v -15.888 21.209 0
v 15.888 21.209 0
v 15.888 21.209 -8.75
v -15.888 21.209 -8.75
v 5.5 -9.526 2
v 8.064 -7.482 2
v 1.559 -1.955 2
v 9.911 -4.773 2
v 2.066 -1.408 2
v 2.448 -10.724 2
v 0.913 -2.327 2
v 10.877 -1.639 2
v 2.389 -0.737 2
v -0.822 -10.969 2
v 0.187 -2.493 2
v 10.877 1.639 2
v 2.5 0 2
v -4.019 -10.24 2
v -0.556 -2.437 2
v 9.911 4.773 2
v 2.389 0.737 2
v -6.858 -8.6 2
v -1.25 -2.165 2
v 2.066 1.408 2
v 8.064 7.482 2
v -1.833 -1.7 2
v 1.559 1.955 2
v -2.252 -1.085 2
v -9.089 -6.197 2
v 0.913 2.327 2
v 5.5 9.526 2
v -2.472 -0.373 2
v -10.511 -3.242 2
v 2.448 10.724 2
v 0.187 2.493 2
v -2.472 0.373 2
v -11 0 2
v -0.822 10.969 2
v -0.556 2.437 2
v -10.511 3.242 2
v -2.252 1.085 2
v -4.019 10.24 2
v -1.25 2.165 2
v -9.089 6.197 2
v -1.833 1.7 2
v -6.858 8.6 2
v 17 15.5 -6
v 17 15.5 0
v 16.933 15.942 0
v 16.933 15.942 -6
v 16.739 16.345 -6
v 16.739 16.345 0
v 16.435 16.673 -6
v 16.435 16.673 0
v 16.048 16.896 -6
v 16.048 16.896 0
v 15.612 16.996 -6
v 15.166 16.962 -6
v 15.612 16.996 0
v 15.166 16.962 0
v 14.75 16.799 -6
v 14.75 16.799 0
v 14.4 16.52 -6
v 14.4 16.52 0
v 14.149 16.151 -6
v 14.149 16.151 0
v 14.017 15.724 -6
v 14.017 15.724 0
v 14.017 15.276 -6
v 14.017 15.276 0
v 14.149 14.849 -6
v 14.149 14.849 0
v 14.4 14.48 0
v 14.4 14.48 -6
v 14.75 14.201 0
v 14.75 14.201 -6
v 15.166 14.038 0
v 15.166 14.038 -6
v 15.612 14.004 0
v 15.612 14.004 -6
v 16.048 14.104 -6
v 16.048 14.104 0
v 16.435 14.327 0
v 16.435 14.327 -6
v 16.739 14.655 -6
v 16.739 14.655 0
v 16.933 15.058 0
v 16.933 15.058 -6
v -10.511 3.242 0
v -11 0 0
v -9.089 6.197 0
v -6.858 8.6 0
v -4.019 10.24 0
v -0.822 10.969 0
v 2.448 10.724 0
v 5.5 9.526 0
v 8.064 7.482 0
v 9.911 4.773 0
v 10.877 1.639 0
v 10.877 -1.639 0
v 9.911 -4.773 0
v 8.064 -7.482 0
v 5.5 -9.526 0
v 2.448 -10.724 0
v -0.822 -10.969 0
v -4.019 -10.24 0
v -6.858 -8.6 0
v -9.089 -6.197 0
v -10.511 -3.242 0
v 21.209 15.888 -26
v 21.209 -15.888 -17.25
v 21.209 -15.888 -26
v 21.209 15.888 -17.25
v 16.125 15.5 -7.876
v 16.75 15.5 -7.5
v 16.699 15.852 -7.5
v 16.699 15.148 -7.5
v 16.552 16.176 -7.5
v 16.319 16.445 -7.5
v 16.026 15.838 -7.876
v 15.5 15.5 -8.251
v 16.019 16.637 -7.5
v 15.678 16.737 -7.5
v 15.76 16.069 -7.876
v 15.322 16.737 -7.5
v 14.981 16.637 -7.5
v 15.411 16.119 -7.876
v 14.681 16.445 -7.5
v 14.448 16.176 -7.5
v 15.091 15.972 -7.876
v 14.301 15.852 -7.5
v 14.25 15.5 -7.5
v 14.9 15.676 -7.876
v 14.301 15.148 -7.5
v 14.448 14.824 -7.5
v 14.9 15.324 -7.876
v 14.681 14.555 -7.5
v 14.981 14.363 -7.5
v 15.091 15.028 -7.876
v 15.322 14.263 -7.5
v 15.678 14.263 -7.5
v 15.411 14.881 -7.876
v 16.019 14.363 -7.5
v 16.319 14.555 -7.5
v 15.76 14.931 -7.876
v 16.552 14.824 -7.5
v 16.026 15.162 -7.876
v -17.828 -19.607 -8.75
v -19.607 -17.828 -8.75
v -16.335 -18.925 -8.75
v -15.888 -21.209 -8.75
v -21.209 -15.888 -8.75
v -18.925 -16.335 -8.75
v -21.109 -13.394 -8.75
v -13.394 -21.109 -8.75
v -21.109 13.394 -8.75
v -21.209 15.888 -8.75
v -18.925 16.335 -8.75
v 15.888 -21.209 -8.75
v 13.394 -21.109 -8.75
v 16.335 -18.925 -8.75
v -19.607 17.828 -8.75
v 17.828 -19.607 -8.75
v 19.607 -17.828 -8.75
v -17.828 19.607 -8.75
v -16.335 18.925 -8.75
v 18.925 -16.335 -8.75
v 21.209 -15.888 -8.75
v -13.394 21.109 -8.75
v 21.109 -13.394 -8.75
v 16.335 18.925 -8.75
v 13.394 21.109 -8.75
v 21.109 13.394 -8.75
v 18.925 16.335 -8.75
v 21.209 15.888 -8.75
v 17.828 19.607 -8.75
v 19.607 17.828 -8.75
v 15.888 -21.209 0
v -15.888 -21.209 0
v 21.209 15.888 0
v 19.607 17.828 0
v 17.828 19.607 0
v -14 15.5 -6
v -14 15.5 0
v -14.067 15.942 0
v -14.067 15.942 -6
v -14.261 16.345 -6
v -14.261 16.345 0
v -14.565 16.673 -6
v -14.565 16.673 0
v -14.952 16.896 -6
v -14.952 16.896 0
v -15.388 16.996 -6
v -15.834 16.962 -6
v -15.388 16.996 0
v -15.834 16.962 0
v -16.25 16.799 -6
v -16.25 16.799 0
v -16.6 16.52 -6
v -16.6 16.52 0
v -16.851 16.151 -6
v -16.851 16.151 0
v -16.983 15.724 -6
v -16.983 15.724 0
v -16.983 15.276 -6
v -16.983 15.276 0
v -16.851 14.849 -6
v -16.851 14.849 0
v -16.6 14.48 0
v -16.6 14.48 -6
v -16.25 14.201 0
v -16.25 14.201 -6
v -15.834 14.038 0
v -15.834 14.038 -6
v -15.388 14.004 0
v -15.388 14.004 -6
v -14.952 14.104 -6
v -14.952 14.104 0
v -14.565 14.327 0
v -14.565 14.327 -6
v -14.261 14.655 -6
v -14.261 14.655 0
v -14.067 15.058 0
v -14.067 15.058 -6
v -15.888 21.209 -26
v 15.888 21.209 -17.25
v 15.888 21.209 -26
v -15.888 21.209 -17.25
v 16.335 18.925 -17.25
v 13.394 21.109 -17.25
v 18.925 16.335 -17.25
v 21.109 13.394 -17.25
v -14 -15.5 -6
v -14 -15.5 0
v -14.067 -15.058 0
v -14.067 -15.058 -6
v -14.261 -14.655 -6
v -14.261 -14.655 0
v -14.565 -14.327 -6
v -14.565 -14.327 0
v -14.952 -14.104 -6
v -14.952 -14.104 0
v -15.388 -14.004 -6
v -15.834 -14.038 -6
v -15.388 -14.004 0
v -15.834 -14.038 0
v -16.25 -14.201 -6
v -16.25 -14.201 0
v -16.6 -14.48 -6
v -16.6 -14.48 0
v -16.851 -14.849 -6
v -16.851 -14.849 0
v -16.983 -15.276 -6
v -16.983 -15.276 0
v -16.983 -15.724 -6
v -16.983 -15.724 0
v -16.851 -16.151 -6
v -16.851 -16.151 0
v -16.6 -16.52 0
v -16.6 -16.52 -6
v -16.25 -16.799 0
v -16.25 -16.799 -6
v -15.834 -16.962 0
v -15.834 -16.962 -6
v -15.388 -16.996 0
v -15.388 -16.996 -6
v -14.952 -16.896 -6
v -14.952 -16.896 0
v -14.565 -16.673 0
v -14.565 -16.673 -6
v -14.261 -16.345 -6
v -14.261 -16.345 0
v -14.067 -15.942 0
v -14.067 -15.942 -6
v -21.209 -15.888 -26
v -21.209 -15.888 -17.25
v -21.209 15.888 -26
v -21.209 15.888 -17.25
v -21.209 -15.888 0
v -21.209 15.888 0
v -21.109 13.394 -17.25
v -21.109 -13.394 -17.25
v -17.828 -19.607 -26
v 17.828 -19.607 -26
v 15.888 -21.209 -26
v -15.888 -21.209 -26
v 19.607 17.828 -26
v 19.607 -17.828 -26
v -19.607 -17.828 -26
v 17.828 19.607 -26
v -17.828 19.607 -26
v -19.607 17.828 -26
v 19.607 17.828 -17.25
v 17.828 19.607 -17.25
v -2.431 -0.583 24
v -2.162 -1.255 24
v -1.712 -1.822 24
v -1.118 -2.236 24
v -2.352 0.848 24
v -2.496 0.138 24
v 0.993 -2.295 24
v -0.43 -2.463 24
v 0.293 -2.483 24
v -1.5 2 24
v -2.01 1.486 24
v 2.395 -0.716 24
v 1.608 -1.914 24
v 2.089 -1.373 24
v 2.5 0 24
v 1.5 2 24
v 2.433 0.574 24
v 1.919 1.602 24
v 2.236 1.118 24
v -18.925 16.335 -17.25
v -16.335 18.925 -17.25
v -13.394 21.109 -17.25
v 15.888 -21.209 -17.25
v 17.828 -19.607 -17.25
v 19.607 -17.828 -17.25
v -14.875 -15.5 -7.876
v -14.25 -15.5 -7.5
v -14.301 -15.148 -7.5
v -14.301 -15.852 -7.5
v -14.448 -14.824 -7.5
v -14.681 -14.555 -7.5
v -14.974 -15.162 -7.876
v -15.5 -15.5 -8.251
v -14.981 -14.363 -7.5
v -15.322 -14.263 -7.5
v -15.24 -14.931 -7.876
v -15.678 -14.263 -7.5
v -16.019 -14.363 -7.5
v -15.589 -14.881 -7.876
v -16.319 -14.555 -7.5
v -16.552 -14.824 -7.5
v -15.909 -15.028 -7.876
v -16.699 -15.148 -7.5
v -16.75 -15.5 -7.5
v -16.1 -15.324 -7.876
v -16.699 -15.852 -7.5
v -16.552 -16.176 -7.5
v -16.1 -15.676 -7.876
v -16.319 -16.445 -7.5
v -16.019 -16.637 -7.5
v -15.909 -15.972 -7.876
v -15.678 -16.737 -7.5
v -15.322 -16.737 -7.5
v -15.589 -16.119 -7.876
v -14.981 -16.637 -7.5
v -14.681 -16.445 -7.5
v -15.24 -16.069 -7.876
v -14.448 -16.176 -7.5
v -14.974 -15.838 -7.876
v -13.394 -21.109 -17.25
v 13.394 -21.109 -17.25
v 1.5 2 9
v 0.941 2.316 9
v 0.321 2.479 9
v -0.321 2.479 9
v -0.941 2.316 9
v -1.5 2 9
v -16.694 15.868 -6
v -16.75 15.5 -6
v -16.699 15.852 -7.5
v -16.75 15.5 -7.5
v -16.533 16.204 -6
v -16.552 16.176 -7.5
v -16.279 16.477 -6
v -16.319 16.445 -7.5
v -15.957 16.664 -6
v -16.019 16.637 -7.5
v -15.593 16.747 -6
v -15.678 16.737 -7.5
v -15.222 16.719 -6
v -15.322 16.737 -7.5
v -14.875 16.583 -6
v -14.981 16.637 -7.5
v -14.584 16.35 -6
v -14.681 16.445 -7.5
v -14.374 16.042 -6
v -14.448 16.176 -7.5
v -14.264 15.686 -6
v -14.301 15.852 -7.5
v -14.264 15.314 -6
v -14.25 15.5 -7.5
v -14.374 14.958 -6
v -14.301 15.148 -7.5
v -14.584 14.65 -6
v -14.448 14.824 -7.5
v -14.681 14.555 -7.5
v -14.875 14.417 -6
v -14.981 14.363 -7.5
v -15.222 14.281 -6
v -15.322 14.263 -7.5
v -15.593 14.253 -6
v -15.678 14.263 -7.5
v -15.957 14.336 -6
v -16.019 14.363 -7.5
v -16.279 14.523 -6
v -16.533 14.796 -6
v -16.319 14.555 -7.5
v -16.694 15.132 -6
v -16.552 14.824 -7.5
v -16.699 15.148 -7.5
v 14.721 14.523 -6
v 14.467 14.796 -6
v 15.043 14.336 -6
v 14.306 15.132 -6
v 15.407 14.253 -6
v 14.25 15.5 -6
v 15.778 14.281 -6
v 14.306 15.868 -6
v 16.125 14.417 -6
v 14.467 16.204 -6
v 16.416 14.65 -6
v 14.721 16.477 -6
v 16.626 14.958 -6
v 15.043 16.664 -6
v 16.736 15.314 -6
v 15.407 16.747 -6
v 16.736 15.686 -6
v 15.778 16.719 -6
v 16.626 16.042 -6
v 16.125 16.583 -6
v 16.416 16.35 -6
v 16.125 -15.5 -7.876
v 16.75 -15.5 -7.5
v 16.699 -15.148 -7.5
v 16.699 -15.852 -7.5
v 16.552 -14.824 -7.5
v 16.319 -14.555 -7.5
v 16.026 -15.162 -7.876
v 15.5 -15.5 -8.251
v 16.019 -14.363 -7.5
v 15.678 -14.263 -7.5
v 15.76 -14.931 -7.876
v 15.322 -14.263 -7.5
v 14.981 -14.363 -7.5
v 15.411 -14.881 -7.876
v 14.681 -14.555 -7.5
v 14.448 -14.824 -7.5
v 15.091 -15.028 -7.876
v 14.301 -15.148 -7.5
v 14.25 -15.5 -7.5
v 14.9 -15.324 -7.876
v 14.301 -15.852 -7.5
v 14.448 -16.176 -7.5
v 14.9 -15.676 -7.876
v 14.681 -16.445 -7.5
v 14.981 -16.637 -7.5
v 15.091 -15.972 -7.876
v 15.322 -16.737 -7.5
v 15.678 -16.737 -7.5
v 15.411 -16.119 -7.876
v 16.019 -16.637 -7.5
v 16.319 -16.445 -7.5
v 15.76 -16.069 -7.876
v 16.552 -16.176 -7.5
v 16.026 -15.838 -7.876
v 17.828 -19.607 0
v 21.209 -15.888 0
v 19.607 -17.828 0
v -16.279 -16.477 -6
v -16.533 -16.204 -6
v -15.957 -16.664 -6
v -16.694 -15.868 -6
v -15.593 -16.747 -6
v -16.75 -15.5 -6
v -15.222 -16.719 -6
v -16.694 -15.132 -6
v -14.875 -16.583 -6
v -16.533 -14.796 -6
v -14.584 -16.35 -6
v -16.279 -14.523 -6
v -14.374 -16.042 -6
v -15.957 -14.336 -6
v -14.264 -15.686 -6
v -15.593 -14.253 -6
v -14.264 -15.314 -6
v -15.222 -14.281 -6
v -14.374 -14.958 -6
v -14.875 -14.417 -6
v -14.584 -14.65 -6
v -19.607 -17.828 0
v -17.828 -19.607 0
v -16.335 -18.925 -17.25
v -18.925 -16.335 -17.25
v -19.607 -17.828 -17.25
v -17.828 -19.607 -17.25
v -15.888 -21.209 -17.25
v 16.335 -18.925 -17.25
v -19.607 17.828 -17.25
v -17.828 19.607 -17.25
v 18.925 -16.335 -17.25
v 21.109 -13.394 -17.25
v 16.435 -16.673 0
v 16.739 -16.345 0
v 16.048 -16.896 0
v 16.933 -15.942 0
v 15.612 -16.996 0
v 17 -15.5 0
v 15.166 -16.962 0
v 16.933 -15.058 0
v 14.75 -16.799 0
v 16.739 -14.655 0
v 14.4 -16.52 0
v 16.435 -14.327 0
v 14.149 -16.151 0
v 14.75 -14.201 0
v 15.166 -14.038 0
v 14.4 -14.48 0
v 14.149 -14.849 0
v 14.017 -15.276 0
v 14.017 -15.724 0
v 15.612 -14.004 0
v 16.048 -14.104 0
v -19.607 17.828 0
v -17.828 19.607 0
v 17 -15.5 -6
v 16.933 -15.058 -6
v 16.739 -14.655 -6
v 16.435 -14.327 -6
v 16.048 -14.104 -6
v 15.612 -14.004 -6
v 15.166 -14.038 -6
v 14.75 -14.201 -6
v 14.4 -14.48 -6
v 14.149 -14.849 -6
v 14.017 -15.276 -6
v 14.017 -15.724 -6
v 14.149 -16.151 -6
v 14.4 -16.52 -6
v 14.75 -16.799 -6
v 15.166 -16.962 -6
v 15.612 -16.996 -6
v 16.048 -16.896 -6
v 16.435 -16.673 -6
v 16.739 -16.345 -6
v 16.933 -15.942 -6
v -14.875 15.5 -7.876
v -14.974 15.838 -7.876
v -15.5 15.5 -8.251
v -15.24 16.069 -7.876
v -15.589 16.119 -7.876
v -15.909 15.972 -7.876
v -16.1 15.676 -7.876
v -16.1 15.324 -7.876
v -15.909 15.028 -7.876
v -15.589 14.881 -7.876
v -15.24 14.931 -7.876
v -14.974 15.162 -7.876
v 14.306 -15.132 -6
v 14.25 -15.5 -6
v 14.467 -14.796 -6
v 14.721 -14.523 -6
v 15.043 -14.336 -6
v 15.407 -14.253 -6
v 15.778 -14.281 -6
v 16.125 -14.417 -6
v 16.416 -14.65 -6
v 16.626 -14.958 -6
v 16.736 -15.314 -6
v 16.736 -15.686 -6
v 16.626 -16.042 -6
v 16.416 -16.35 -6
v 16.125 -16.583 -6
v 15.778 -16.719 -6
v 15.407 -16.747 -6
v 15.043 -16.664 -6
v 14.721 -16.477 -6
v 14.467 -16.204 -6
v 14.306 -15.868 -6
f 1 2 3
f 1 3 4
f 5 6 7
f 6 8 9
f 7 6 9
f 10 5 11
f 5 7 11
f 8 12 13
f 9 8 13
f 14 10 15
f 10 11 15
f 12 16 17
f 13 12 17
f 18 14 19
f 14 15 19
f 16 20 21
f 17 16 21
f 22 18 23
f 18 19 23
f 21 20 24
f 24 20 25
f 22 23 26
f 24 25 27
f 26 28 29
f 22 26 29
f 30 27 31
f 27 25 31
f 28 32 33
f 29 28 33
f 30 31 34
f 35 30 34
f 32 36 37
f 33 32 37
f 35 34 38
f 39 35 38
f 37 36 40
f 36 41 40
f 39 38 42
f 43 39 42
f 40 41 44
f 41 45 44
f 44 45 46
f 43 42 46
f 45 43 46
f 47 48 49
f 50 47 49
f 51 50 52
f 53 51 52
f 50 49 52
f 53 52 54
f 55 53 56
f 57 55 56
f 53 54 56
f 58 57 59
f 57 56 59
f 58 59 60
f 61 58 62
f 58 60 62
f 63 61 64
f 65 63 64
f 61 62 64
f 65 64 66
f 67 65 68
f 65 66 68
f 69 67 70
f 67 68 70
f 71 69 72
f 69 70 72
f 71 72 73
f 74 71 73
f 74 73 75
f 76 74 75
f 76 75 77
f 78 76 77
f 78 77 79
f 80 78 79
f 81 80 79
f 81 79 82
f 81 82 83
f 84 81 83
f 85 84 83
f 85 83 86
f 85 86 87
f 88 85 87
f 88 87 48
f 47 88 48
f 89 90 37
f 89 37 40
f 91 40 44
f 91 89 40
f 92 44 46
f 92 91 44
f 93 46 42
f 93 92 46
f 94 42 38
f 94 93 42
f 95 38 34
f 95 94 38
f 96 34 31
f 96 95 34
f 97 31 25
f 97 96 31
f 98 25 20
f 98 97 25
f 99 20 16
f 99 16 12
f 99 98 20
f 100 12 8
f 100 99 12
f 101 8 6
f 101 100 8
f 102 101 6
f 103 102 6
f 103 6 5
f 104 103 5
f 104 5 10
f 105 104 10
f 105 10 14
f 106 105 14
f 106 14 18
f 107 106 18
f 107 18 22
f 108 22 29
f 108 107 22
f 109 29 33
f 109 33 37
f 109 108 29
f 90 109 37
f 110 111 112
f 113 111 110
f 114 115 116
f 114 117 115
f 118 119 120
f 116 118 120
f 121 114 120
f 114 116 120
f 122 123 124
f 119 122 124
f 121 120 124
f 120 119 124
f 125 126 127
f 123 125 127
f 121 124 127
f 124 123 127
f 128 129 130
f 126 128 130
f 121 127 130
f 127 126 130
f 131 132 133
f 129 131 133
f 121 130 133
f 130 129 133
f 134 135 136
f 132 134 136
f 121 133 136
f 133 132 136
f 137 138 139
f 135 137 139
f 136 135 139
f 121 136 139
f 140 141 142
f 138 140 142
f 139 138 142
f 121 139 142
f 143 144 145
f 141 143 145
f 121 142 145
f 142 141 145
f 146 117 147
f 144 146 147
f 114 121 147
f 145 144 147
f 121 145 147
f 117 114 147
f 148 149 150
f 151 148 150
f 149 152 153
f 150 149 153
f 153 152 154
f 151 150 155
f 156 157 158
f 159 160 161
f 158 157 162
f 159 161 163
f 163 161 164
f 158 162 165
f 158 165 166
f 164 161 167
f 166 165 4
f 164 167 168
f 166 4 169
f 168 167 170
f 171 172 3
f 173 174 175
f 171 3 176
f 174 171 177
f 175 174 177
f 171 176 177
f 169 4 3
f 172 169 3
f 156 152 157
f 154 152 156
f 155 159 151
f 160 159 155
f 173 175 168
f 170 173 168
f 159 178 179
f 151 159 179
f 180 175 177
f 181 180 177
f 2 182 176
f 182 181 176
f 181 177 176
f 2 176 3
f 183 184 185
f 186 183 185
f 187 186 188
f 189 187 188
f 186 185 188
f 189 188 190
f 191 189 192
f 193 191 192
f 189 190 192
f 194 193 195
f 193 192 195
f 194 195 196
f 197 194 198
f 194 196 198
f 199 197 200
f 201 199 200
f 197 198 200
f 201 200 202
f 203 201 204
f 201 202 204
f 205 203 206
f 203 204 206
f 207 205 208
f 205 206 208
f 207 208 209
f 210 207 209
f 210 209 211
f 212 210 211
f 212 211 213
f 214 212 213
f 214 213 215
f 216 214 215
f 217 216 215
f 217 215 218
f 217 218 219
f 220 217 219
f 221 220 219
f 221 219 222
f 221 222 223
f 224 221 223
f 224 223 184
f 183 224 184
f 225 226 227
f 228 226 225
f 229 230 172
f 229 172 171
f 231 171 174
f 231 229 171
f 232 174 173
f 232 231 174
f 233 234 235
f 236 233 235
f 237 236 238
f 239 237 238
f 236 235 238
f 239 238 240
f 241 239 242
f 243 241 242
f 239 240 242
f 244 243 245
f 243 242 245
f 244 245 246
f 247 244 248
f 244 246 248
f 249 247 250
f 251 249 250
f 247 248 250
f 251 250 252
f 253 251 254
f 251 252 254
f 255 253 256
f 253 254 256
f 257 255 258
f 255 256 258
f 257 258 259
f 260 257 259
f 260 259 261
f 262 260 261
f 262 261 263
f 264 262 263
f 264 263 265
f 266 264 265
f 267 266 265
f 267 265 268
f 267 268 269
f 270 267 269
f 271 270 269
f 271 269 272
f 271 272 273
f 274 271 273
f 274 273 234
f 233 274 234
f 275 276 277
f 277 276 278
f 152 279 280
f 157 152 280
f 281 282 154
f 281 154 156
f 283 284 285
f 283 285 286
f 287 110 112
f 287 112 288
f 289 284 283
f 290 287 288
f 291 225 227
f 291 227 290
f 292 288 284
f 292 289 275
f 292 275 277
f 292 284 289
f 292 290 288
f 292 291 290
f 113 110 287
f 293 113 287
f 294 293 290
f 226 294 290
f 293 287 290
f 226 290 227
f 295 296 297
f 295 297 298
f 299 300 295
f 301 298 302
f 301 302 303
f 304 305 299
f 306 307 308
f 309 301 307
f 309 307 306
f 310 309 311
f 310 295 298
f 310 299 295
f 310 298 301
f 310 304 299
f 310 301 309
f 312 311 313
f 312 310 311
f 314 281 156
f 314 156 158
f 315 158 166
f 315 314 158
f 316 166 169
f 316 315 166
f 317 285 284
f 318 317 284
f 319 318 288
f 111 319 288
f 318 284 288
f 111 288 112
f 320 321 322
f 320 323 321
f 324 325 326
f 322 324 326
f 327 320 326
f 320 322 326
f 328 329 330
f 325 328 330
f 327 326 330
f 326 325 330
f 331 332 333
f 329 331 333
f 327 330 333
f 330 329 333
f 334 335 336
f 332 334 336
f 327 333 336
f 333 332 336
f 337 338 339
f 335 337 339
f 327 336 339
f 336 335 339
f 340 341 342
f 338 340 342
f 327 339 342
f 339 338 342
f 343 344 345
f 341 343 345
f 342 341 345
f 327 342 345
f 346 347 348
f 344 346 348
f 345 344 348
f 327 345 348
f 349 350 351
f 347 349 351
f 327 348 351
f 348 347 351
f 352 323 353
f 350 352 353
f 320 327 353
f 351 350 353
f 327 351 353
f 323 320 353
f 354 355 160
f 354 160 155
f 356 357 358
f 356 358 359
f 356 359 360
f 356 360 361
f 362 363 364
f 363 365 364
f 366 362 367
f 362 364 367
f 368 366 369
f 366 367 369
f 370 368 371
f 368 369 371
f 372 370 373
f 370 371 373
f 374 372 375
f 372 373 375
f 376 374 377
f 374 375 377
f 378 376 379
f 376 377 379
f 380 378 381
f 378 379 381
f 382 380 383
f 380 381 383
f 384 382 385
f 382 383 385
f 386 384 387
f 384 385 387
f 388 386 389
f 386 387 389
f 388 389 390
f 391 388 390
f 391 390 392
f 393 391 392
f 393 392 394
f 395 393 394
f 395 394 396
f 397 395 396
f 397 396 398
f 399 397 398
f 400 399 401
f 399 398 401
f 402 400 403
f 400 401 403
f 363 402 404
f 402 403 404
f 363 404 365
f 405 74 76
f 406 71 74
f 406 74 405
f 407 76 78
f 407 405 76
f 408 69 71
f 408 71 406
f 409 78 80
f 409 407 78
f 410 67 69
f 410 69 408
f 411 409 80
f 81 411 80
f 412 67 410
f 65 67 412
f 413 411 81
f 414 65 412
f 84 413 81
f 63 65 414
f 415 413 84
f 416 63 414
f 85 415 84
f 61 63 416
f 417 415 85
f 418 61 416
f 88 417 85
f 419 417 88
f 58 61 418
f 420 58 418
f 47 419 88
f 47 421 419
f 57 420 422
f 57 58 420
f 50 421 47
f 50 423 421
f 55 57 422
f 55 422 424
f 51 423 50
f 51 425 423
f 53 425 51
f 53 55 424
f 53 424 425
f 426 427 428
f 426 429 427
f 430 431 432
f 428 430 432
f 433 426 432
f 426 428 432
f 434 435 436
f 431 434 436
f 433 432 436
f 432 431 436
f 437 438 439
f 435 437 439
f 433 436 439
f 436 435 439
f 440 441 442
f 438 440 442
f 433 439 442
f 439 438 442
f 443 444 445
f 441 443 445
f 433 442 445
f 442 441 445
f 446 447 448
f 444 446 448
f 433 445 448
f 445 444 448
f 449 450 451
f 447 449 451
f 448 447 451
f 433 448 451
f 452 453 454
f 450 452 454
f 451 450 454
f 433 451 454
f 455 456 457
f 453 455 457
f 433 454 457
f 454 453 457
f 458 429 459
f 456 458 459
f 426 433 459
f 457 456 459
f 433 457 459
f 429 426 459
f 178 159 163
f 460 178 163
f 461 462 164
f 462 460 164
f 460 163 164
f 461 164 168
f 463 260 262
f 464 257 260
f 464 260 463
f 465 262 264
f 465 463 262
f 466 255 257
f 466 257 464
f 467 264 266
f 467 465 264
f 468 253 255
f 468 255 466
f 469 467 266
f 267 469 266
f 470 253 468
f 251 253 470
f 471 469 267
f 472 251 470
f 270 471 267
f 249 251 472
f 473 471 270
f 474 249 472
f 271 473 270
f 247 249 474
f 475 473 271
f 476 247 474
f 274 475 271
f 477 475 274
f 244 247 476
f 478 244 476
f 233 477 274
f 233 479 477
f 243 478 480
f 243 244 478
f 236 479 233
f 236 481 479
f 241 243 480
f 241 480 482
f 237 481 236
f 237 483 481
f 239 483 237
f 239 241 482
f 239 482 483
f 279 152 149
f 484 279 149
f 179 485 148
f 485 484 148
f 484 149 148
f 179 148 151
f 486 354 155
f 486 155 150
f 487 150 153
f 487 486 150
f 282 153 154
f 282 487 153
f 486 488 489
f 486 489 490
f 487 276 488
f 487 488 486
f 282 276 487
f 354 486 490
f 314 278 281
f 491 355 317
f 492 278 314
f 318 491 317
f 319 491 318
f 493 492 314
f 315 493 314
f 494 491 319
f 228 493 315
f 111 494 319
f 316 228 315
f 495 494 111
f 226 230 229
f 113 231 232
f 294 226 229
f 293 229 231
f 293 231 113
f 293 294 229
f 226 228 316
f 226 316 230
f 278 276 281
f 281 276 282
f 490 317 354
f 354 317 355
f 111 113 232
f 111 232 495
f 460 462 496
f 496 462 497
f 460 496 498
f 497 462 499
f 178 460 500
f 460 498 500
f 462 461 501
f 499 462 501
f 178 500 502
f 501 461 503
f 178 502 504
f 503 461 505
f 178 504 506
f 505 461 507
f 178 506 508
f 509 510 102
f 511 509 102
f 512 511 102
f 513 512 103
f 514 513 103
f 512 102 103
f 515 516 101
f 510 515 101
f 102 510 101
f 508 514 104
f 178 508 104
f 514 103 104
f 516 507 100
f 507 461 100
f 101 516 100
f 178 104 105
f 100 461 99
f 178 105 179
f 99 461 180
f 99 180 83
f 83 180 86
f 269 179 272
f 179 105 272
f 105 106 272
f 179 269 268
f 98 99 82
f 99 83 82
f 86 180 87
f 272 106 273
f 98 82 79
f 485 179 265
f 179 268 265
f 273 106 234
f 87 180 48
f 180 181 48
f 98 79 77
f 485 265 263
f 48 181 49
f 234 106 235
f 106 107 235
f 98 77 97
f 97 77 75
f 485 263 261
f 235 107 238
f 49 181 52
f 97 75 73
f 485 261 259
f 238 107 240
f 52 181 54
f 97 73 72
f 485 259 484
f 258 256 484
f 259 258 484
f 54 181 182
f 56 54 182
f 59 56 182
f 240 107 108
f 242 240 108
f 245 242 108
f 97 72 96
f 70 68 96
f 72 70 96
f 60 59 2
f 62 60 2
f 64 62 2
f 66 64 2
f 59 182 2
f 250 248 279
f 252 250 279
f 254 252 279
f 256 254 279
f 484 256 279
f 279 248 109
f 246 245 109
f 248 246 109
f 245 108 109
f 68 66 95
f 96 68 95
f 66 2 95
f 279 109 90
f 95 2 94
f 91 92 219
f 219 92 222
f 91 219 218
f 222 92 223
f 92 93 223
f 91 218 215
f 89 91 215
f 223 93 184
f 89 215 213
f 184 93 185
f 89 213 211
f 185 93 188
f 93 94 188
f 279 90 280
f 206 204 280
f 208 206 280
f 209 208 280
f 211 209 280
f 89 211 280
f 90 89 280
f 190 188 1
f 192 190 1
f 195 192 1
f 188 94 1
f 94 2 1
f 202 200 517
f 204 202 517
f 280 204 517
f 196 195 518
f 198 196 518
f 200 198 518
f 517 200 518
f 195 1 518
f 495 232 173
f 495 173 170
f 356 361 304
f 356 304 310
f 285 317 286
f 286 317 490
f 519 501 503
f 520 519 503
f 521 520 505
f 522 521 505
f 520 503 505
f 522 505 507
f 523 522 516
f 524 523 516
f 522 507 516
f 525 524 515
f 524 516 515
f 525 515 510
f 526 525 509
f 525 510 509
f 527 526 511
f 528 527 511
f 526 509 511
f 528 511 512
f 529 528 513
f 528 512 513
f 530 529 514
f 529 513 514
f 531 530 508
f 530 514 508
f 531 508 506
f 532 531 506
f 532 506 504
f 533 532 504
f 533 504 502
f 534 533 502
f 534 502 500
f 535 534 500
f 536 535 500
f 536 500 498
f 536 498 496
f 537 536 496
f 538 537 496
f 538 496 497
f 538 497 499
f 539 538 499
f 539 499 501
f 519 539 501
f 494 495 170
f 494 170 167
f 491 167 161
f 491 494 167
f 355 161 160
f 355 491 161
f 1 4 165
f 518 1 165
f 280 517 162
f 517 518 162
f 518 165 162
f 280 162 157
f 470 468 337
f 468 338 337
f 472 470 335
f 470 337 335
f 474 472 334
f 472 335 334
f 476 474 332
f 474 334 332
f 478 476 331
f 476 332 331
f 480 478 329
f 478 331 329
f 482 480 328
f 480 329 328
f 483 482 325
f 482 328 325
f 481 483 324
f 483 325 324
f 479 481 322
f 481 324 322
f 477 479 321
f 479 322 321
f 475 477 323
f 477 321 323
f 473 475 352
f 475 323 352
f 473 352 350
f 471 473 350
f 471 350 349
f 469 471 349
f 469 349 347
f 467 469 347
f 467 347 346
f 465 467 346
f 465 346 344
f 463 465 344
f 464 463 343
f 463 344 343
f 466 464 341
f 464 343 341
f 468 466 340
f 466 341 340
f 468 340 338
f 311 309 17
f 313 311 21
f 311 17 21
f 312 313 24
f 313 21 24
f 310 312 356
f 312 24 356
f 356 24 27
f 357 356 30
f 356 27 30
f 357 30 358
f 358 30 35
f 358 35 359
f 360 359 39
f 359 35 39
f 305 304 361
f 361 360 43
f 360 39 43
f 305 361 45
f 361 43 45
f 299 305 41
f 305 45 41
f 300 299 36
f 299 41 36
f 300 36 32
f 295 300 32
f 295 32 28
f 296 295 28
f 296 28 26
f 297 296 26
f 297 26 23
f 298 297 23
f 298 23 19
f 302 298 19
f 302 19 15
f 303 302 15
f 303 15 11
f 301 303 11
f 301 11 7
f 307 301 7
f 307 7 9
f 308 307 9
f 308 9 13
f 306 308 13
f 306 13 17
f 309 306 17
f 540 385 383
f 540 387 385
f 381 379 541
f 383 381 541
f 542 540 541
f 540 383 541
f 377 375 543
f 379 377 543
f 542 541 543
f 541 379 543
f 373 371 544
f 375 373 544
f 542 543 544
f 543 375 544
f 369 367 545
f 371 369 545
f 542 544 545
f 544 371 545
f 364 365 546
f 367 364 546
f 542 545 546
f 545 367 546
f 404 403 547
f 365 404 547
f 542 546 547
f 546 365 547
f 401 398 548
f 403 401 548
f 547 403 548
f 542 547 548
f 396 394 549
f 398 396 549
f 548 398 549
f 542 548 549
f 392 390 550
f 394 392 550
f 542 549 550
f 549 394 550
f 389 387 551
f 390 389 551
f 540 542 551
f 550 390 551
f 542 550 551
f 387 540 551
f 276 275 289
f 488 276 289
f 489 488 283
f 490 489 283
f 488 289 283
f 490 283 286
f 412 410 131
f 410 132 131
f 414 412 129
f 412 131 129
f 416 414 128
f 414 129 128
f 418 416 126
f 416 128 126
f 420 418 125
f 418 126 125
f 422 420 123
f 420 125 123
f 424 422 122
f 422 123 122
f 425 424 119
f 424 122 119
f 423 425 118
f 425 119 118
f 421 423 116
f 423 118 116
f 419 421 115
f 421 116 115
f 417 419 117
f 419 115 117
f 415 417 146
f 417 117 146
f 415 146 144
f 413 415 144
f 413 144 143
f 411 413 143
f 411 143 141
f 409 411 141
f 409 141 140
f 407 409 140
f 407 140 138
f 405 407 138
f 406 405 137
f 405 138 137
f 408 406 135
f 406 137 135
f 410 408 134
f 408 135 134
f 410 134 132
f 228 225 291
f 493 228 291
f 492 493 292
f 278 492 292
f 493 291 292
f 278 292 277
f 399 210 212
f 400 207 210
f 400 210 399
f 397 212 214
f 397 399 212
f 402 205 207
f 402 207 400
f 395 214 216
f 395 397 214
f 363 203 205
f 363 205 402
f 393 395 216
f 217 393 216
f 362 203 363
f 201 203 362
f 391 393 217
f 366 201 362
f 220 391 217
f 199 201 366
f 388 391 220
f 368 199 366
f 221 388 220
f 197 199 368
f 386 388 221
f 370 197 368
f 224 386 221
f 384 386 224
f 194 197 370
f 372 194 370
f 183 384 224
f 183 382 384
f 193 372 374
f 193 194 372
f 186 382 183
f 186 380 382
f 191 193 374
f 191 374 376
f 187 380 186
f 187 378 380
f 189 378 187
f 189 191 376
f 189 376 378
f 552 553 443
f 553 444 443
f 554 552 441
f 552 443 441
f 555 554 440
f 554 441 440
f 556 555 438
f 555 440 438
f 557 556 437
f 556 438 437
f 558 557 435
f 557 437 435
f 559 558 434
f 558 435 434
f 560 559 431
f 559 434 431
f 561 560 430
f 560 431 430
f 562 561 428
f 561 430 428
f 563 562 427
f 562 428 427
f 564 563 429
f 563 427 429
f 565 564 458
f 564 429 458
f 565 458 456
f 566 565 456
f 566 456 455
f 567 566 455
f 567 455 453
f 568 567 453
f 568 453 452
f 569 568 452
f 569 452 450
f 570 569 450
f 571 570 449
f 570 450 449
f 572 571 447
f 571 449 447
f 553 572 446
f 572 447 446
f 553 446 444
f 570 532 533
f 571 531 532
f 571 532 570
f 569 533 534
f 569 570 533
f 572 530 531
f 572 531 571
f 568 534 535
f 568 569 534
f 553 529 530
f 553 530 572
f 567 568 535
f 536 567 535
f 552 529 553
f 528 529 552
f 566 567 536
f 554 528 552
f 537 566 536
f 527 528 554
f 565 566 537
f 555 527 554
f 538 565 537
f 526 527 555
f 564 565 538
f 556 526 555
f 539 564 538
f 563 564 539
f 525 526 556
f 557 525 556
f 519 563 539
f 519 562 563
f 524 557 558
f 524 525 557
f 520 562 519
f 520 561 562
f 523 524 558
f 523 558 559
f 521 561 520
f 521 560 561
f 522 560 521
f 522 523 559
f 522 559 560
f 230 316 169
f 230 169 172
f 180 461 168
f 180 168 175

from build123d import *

# Parameters (mm, degrees)
SKETCH1_R                       = 2.5
BOSS_EXTRUDE1_DEPTH             = 24
SKETCH2_R                       = 11
BOSS_EXTRUDE2_DEPTH             = 2
SKETCH3_W                       = 42.418
SKETCH3_H                       = 42.418
BOSS_EXTRUDE3_DEPTH             = 26
CUT_EXTRUDE1_DEPTH              = 59.306460723
M3X0_5_TAPPED_HOLE1_D           = 2.5
M3X0_5_TAPPED_HOLE1_DEPTH       = 7.5
M3X0_5_TAPPED_HOLE1_CBORE_D     = 3
M3X0_5_TAPPED_HOLE1_CBORE_DEPTH = 6
M3X0_5_TAPPED_HOLE1_TIP         = 0.751075774
CUT_EXTRUDE2_START              = -15
CUT_EXTRUDE2_DEPTH              = 15
CUT_EXTRUDE3_DEPTH              = 4.25
CUT_EXTRUDE3_DEPTH_BACK         = 4.25


with BuildPart() as part:
    # Sketch1 → Boss-Extrude1 (new body)
    with BuildSketch(Plane.XY):
        Circle(SKETCH1_R)
    extrude(amount=BOSS_EXTRUDE1_DEPTH)

    # Sketch2 → Boss-Extrude2 (add)
    with BuildSketch(Plane(origin=(0, 0, 0), x_dir=(-1, 0, 0), z_dir=(0, 0, -1))):
        Circle(SKETCH2_R)
    extrude(amount=-BOSS_EXTRUDE2_DEPTH)

    # Sketch3 → Boss-Extrude3 (add)
    with BuildSketch(Plane(origin=(0, 0, 0), x_dir=(-1, 0, 0), z_dir=(0, 0, -1))):
        Rectangle(SKETCH3_W, SKETCH3_H)
    extrude(amount=BOSS_EXTRUDE3_DEPTH)

    # Sketch4 → Cut-Extrude1 (cut, through all)
    with BuildSketch(Plane(origin=(0, 0, -26), x_dir=(-1, 0, 0), z_dir=(0, 0, -1))):
        with BuildLine():
            Line((-21.209, -15.887992919), (-21.209, -21.209))
            Line((-21.209, -21.209), (-15.887992919, -21.209))
            ThreePointArc((-15.887992919, -21.209), (-18.738329701, -18.738329701), (-21.209, -15.887992919))
        make_face()
        with BuildLine():
            Line((15.887992919, -21.209), (21.209, -21.209))
            Line((21.209, -21.209), (21.209, -15.887992919))
            ThreePointArc((21.209, -15.887992919), (18.738329701, -18.738329701), (15.887992919, -21.209))
        make_face()
        with BuildLine():
            Line((21.209, 15.887992919), (21.209, 21.209))
            Line((21.209, 21.209), (15.887992919, 21.209))
            ThreePointArc((15.887992919, 21.209), (18.738329701, 18.738329701), (21.209, 15.887992919))
        make_face()
        with BuildLine():
            Line((-15.887992919, 21.209), (-21.209, 21.209))
            Line((-21.209, 21.209), (-21.209, 15.887992919))
            ThreePointArc((-21.209, 15.887992919), (-18.738329701, 18.738329701), (-15.887992919, 21.209))
        make_face()
    extrude(amount=-CUT_EXTRUDE1_DEPTH, mode=Mode.SUBTRACT)

    # M3x0.5 Tapped Hole1
    with Locations(Plane.XY):
        with Locations((-15.5, 15.5), (-15.5, -15.5), (15.5, -15.5), (15.5, 15.5)):
            CounterBoreHole(M3X0_5_TAPPED_HOLE1_D / 2, M3X0_5_TAPPED_HOLE1_CBORE_D / 2, M3X0_5_TAPPED_HOLE1_CBORE_DEPTH, depth=M3X0_5_TAPPED_HOLE1_DEPTH)
            with Locations((0, 0, -(M3X0_5_TAPPED_HOLE1_DEPTH + M3X0_5_TAPPED_HOLE1_TIP / 2))):  # 118° drill point
                Cone(0, M3X0_5_TAPPED_HOLE1_D / 2, M3X0_5_TAPPED_HOLE1_TIP, mode=Mode.SUBTRACT)

    # Sketch7 → Cut-Extrude2 (cut)
    with BuildSketch(Plane.XY.offset(24).offset(CUT_EXTRUDE2_START)):
        with BuildLine():
            Line((-1.5, 2), (1.5, 2))
            ThreePointArc((1.5, 2), (0, 2.5), (-1.5, 2))
        make_face()
    extrude(amount=CUT_EXTRUDE2_DEPTH, mode=Mode.SUBTRACT)

    # Sketch8 → Cut-Extrude3 (cut, two sides: drawn at the far end of the back side and taken through both)
    with BuildSketch(Plane.XY.offset(-13).offset(-CUT_EXTRUDE3_DEPTH_BACK)):
        with BuildLine():
            Line((15.887992919, 21.209), (-15.887992919, 21.209))
            ThreePointArc((-15.887992919, 21.209), (-18.738329701, 18.738329701), (-21.209, 15.887992919))
            Line((-21.209, 15.887992919), (-21.209, -15.887992919))
            ThreePointArc((-21.209, -15.887992919), (-18.738329701, -18.738329701), (-15.887992919, -21.209))
            Line((-15.887992919, -21.209), (15.887992919, -21.209))
            ThreePointArc((15.887992919, -21.209), (18.738329701, -18.738329701), (21.209, -15.887992919))
            Line((21.209, -15.887992919), (21.209, 15.887992919))
            ThreePointArc((21.209, 15.887992919), (18.738329701, 18.738329701), (15.887992919, 21.209))
        make_face()
        with BuildLine():
            Line((-13.394406258, 21.109), (13.394406258, 21.109))
            ThreePointArc((13.394406258, 21.109), (17.67766953, 17.67766953), (21.109, 13.394406258))
            Line((21.109, 13.394406258), (21.109, -13.394406258))
            ThreePointArc((21.109, -13.394406258), (17.67766953, -17.67766953), (13.394406258, -21.109))
            Line((13.394406258, -21.109), (-13.394406258, -21.109))
            ThreePointArc((-13.394406258, -21.109), (-17.67766953, -17.67766953), (-21.109, -13.394406258))
            Line((-21.109, -13.394406258), (-21.109, 13.394406258))
            ThreePointArc((-21.109, 13.394406258), (-17.67766953, 17.67766953), (-13.394406258, 21.109))
        make_face(mode=Mode.SUBTRACT)
    extrude(amount=CUT_EXTRUDE3_DEPTH + CUT_EXTRUDE3_DEPTH_BACK, mode=Mode.SUBTRACT)


solid = part.part
